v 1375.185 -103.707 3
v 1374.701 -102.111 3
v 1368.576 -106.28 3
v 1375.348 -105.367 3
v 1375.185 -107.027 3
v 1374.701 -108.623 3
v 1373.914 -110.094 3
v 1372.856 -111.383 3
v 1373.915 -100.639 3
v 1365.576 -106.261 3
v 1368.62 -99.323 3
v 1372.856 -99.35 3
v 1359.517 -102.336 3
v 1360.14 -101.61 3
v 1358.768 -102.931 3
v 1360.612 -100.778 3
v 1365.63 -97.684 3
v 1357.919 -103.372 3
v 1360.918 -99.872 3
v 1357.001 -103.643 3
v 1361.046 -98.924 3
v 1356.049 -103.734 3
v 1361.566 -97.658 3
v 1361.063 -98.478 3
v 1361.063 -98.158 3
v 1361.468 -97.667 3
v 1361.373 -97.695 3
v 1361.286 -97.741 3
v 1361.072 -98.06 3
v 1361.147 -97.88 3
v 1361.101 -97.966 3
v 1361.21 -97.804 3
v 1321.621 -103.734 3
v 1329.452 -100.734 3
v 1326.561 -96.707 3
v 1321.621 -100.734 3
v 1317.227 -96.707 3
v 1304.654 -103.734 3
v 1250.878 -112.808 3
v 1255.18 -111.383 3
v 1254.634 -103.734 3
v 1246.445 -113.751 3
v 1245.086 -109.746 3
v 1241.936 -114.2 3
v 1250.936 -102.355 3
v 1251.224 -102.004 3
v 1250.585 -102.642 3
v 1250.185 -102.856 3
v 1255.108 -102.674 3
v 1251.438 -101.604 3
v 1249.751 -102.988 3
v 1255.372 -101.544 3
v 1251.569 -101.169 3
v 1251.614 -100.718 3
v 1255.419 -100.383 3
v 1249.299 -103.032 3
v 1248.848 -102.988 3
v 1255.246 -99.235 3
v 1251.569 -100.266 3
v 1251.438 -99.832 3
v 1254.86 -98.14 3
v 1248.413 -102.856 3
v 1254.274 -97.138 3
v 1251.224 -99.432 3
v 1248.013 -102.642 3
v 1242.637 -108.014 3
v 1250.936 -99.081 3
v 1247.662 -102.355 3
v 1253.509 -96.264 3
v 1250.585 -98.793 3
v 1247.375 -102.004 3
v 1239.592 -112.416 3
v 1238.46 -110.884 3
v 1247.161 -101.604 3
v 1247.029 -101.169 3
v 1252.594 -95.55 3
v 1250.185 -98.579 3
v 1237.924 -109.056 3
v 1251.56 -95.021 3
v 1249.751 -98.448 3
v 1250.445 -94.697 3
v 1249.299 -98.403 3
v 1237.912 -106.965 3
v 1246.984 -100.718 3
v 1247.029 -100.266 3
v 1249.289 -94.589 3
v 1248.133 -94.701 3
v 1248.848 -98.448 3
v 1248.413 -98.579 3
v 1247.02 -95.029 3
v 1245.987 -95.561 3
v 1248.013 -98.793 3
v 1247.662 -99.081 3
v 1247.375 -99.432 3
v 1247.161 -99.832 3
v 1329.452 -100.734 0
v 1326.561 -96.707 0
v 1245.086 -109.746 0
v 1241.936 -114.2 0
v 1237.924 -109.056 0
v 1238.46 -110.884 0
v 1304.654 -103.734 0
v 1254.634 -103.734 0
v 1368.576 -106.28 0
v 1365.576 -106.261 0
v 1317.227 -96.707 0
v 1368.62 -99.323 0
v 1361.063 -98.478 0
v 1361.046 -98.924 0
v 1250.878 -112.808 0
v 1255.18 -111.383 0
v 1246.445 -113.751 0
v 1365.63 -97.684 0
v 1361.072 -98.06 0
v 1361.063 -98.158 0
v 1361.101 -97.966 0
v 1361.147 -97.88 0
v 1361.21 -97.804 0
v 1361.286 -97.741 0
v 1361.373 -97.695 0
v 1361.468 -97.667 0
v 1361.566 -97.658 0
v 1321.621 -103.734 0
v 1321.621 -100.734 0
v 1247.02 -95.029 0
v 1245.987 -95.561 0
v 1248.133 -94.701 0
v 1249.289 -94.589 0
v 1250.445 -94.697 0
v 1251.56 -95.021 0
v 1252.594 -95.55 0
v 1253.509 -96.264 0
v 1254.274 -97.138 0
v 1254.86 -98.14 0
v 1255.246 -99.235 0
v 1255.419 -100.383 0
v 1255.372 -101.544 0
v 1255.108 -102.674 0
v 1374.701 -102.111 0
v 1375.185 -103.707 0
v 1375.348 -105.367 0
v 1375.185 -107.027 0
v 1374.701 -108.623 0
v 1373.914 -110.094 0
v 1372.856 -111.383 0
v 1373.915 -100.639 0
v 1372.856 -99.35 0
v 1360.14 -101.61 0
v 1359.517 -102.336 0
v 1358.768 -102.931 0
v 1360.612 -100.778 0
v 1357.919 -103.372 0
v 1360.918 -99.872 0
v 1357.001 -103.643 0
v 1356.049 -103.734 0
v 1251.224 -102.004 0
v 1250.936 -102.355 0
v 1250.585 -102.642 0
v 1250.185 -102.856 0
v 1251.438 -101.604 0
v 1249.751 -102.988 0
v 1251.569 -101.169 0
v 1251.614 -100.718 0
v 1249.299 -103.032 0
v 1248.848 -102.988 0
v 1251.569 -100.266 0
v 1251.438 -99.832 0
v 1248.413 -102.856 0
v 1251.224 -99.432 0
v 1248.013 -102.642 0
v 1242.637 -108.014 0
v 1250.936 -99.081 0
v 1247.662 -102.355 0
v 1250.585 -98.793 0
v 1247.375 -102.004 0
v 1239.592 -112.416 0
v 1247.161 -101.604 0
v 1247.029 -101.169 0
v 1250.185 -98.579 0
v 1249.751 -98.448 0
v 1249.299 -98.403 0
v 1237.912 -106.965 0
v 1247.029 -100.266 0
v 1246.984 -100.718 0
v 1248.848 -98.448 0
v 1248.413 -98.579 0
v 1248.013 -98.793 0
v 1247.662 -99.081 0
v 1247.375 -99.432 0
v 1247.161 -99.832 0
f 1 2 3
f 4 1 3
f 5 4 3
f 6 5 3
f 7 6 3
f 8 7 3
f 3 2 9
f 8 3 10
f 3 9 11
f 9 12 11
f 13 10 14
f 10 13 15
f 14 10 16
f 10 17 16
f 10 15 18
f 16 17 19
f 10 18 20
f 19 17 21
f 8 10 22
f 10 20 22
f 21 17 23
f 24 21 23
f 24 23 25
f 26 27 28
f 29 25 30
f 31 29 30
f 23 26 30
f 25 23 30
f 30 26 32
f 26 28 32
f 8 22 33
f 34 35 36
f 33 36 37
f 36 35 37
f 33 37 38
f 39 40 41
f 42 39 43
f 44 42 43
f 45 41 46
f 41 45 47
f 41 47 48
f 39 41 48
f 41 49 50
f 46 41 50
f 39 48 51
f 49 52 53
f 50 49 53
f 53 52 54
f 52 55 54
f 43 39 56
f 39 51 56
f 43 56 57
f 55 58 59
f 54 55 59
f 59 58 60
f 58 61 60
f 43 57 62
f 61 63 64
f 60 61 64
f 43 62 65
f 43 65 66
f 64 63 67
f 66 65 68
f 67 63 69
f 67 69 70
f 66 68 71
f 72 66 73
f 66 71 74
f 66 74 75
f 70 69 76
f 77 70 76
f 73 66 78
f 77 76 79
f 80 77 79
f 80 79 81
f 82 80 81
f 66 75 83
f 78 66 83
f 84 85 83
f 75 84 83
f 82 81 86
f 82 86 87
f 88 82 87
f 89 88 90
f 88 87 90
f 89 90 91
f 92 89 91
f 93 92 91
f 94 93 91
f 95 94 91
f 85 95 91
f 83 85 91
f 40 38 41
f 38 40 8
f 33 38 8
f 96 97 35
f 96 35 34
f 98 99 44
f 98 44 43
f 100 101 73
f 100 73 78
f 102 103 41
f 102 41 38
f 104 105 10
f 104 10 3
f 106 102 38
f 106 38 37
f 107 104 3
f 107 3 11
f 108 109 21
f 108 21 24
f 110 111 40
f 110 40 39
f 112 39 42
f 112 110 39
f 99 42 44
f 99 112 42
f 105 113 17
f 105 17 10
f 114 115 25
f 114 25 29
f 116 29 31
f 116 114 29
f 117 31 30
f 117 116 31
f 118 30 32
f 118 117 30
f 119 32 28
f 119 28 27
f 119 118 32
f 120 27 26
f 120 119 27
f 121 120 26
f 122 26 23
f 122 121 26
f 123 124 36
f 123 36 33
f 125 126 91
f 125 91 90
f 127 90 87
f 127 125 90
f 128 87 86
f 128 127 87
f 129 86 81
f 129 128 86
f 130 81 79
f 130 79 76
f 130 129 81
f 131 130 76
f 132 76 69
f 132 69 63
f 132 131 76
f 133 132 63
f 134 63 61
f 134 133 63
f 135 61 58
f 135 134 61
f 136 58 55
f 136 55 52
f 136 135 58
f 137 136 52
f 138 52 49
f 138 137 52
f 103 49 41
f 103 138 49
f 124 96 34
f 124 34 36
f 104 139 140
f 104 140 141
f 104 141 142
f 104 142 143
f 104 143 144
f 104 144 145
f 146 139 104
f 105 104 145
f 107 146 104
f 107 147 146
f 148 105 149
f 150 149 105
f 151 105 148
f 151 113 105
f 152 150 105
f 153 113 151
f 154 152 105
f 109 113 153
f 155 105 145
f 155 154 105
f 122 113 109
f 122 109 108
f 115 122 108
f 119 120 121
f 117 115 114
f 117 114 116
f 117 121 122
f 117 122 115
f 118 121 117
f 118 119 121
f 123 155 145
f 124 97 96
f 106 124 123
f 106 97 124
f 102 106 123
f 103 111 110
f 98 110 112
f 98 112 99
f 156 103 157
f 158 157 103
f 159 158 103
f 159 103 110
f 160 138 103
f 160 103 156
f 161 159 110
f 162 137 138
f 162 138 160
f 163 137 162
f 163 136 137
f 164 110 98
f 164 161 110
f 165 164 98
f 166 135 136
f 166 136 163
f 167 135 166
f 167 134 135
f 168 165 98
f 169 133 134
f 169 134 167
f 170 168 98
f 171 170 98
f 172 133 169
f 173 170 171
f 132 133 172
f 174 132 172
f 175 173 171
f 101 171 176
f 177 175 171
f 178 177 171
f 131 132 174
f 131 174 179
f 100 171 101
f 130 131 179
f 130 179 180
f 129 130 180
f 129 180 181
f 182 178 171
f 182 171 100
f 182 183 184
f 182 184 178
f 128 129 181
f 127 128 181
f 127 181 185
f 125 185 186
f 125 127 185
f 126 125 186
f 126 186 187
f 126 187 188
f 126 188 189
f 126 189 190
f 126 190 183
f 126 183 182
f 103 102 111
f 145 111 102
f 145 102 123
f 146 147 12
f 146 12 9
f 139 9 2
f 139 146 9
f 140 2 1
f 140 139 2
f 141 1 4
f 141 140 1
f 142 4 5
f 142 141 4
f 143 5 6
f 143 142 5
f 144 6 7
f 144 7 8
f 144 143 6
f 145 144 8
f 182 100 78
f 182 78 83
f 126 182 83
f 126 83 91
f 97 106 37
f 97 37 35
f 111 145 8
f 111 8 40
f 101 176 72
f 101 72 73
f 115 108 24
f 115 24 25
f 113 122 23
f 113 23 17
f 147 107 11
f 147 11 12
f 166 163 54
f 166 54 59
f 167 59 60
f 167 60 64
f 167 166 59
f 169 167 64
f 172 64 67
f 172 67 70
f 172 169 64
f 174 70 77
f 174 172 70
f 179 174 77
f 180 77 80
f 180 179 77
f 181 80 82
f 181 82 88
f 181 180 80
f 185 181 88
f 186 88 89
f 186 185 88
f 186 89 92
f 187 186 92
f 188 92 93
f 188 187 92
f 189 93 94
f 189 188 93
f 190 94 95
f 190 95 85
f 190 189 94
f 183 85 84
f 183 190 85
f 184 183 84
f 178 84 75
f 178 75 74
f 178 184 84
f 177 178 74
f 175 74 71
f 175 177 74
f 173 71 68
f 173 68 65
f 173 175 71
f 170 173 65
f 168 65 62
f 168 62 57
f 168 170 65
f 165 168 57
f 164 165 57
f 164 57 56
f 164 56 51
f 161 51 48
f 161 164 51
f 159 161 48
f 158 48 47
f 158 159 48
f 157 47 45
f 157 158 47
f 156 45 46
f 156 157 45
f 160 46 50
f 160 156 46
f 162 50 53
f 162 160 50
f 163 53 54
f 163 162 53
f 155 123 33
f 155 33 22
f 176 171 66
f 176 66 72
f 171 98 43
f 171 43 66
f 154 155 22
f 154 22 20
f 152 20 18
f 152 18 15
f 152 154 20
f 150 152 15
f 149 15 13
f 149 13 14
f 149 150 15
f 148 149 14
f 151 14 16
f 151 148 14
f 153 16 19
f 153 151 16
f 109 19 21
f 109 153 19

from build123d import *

# Parameters (mm, degrees)
SKETCH1_R          = 2.314653827
BASE_EXTRUDE_DEPTH = 3


with BuildPart() as part:
    # Sketch1 → Base-Extrude (new body)
    with BuildSketch(Plane.XY):
        with BuildLine():
            Line((1237.912051302, -106.965442143), (1245.987496986, -95.560571197))
            ThreePointArc((1245.987496986, -95.560571197), (1253.509408231, -96.263863256), (1254.634364731, -103.73435463))
            Line((1254.634364731, -103.73435463), (1304.653724872, -103.73435463))
            Line((1304.653724872, -103.73435463), (1317.227321876, -96.706912395))
            Line((1317.227321876, -96.706912395), (1326.560817804, -96.706912395))
            Line((1326.560817804, -96.706912395), (1329.452389013, -100.73435463))
            Line((1329.452389013, -100.73435463), (1321.620543519, -100.73435463))
            Line((1321.620543519, -100.73435463), (1321.620543519, -103.73435463))
            Line((1321.620543519, -103.73435463), (1356.049186006, -103.73435463))
            ThreePointArc((1356.049186006, -103.73435463), (1359.51702166, -102.336314635), (1361.045588138, -98.92400098))
            Line((1361.045588138, -98.92400098), (1361.062528583, -98.477689842))
            Line((1361.062528583, -98.477689842), (1361.062528583, -98.158287995))
            ThreePointArc((1361.062528583, -98.158287995), (1361.210092551, -97.803620765), (1361.565683957, -97.658297951))
            Line((1361.565683957, -97.658297951), (1365.63036841, -97.683949663))
            Line((1365.63036841, -97.683949663), (1365.576237812, -106.261303213))
            Line((1365.576237812, -106.261303213), (1368.576237812, -106.280235835))
            Line((1368.576237812, -106.280235835), (1368.620142395, -99.323262365))
            Line((1368.620142395, -99.323262365), (1372.856385089, -99.349996759))
            ThreePointArc((1372.856385089, -99.349996759), (1375.348322676, -105.366702643), (1372.855935111, -111.383222141))
            Line((1372.855935111, -111.383222141), (1255.179553467, -111.383222141))
            ThreePointArc((1255.179553467, -111.383222141), (1248.674645996, -113.340903741), (1241.936111152, -114.200256171))
            Line((1241.936111152, -114.200256171), (1245.086093213, -109.745869716))
            Line((1245.086093213, -109.745869716), (1242.636669623, -108.013725357))
            Line((1242.636669623, -108.013725357), (1239.591696444, -112.41591336))
            Line((1239.591696444, -112.41591336), (1238.460322727, -110.884264434))
            Line((1238.460322727, -110.884264434), (1237.923801474, -109.055713836))
            Line((1237.923801474, -109.055713836), (1237.912051302, -106.965442143))
        make_face()
        with Locations((1249.299132798, -100.717822078)):
            Circle(SKETCH1_R, mode=Mode.SUBTRACT)
    extrude(amount=BASE_EXTRUDE_DEPTH)


solid = part.part
